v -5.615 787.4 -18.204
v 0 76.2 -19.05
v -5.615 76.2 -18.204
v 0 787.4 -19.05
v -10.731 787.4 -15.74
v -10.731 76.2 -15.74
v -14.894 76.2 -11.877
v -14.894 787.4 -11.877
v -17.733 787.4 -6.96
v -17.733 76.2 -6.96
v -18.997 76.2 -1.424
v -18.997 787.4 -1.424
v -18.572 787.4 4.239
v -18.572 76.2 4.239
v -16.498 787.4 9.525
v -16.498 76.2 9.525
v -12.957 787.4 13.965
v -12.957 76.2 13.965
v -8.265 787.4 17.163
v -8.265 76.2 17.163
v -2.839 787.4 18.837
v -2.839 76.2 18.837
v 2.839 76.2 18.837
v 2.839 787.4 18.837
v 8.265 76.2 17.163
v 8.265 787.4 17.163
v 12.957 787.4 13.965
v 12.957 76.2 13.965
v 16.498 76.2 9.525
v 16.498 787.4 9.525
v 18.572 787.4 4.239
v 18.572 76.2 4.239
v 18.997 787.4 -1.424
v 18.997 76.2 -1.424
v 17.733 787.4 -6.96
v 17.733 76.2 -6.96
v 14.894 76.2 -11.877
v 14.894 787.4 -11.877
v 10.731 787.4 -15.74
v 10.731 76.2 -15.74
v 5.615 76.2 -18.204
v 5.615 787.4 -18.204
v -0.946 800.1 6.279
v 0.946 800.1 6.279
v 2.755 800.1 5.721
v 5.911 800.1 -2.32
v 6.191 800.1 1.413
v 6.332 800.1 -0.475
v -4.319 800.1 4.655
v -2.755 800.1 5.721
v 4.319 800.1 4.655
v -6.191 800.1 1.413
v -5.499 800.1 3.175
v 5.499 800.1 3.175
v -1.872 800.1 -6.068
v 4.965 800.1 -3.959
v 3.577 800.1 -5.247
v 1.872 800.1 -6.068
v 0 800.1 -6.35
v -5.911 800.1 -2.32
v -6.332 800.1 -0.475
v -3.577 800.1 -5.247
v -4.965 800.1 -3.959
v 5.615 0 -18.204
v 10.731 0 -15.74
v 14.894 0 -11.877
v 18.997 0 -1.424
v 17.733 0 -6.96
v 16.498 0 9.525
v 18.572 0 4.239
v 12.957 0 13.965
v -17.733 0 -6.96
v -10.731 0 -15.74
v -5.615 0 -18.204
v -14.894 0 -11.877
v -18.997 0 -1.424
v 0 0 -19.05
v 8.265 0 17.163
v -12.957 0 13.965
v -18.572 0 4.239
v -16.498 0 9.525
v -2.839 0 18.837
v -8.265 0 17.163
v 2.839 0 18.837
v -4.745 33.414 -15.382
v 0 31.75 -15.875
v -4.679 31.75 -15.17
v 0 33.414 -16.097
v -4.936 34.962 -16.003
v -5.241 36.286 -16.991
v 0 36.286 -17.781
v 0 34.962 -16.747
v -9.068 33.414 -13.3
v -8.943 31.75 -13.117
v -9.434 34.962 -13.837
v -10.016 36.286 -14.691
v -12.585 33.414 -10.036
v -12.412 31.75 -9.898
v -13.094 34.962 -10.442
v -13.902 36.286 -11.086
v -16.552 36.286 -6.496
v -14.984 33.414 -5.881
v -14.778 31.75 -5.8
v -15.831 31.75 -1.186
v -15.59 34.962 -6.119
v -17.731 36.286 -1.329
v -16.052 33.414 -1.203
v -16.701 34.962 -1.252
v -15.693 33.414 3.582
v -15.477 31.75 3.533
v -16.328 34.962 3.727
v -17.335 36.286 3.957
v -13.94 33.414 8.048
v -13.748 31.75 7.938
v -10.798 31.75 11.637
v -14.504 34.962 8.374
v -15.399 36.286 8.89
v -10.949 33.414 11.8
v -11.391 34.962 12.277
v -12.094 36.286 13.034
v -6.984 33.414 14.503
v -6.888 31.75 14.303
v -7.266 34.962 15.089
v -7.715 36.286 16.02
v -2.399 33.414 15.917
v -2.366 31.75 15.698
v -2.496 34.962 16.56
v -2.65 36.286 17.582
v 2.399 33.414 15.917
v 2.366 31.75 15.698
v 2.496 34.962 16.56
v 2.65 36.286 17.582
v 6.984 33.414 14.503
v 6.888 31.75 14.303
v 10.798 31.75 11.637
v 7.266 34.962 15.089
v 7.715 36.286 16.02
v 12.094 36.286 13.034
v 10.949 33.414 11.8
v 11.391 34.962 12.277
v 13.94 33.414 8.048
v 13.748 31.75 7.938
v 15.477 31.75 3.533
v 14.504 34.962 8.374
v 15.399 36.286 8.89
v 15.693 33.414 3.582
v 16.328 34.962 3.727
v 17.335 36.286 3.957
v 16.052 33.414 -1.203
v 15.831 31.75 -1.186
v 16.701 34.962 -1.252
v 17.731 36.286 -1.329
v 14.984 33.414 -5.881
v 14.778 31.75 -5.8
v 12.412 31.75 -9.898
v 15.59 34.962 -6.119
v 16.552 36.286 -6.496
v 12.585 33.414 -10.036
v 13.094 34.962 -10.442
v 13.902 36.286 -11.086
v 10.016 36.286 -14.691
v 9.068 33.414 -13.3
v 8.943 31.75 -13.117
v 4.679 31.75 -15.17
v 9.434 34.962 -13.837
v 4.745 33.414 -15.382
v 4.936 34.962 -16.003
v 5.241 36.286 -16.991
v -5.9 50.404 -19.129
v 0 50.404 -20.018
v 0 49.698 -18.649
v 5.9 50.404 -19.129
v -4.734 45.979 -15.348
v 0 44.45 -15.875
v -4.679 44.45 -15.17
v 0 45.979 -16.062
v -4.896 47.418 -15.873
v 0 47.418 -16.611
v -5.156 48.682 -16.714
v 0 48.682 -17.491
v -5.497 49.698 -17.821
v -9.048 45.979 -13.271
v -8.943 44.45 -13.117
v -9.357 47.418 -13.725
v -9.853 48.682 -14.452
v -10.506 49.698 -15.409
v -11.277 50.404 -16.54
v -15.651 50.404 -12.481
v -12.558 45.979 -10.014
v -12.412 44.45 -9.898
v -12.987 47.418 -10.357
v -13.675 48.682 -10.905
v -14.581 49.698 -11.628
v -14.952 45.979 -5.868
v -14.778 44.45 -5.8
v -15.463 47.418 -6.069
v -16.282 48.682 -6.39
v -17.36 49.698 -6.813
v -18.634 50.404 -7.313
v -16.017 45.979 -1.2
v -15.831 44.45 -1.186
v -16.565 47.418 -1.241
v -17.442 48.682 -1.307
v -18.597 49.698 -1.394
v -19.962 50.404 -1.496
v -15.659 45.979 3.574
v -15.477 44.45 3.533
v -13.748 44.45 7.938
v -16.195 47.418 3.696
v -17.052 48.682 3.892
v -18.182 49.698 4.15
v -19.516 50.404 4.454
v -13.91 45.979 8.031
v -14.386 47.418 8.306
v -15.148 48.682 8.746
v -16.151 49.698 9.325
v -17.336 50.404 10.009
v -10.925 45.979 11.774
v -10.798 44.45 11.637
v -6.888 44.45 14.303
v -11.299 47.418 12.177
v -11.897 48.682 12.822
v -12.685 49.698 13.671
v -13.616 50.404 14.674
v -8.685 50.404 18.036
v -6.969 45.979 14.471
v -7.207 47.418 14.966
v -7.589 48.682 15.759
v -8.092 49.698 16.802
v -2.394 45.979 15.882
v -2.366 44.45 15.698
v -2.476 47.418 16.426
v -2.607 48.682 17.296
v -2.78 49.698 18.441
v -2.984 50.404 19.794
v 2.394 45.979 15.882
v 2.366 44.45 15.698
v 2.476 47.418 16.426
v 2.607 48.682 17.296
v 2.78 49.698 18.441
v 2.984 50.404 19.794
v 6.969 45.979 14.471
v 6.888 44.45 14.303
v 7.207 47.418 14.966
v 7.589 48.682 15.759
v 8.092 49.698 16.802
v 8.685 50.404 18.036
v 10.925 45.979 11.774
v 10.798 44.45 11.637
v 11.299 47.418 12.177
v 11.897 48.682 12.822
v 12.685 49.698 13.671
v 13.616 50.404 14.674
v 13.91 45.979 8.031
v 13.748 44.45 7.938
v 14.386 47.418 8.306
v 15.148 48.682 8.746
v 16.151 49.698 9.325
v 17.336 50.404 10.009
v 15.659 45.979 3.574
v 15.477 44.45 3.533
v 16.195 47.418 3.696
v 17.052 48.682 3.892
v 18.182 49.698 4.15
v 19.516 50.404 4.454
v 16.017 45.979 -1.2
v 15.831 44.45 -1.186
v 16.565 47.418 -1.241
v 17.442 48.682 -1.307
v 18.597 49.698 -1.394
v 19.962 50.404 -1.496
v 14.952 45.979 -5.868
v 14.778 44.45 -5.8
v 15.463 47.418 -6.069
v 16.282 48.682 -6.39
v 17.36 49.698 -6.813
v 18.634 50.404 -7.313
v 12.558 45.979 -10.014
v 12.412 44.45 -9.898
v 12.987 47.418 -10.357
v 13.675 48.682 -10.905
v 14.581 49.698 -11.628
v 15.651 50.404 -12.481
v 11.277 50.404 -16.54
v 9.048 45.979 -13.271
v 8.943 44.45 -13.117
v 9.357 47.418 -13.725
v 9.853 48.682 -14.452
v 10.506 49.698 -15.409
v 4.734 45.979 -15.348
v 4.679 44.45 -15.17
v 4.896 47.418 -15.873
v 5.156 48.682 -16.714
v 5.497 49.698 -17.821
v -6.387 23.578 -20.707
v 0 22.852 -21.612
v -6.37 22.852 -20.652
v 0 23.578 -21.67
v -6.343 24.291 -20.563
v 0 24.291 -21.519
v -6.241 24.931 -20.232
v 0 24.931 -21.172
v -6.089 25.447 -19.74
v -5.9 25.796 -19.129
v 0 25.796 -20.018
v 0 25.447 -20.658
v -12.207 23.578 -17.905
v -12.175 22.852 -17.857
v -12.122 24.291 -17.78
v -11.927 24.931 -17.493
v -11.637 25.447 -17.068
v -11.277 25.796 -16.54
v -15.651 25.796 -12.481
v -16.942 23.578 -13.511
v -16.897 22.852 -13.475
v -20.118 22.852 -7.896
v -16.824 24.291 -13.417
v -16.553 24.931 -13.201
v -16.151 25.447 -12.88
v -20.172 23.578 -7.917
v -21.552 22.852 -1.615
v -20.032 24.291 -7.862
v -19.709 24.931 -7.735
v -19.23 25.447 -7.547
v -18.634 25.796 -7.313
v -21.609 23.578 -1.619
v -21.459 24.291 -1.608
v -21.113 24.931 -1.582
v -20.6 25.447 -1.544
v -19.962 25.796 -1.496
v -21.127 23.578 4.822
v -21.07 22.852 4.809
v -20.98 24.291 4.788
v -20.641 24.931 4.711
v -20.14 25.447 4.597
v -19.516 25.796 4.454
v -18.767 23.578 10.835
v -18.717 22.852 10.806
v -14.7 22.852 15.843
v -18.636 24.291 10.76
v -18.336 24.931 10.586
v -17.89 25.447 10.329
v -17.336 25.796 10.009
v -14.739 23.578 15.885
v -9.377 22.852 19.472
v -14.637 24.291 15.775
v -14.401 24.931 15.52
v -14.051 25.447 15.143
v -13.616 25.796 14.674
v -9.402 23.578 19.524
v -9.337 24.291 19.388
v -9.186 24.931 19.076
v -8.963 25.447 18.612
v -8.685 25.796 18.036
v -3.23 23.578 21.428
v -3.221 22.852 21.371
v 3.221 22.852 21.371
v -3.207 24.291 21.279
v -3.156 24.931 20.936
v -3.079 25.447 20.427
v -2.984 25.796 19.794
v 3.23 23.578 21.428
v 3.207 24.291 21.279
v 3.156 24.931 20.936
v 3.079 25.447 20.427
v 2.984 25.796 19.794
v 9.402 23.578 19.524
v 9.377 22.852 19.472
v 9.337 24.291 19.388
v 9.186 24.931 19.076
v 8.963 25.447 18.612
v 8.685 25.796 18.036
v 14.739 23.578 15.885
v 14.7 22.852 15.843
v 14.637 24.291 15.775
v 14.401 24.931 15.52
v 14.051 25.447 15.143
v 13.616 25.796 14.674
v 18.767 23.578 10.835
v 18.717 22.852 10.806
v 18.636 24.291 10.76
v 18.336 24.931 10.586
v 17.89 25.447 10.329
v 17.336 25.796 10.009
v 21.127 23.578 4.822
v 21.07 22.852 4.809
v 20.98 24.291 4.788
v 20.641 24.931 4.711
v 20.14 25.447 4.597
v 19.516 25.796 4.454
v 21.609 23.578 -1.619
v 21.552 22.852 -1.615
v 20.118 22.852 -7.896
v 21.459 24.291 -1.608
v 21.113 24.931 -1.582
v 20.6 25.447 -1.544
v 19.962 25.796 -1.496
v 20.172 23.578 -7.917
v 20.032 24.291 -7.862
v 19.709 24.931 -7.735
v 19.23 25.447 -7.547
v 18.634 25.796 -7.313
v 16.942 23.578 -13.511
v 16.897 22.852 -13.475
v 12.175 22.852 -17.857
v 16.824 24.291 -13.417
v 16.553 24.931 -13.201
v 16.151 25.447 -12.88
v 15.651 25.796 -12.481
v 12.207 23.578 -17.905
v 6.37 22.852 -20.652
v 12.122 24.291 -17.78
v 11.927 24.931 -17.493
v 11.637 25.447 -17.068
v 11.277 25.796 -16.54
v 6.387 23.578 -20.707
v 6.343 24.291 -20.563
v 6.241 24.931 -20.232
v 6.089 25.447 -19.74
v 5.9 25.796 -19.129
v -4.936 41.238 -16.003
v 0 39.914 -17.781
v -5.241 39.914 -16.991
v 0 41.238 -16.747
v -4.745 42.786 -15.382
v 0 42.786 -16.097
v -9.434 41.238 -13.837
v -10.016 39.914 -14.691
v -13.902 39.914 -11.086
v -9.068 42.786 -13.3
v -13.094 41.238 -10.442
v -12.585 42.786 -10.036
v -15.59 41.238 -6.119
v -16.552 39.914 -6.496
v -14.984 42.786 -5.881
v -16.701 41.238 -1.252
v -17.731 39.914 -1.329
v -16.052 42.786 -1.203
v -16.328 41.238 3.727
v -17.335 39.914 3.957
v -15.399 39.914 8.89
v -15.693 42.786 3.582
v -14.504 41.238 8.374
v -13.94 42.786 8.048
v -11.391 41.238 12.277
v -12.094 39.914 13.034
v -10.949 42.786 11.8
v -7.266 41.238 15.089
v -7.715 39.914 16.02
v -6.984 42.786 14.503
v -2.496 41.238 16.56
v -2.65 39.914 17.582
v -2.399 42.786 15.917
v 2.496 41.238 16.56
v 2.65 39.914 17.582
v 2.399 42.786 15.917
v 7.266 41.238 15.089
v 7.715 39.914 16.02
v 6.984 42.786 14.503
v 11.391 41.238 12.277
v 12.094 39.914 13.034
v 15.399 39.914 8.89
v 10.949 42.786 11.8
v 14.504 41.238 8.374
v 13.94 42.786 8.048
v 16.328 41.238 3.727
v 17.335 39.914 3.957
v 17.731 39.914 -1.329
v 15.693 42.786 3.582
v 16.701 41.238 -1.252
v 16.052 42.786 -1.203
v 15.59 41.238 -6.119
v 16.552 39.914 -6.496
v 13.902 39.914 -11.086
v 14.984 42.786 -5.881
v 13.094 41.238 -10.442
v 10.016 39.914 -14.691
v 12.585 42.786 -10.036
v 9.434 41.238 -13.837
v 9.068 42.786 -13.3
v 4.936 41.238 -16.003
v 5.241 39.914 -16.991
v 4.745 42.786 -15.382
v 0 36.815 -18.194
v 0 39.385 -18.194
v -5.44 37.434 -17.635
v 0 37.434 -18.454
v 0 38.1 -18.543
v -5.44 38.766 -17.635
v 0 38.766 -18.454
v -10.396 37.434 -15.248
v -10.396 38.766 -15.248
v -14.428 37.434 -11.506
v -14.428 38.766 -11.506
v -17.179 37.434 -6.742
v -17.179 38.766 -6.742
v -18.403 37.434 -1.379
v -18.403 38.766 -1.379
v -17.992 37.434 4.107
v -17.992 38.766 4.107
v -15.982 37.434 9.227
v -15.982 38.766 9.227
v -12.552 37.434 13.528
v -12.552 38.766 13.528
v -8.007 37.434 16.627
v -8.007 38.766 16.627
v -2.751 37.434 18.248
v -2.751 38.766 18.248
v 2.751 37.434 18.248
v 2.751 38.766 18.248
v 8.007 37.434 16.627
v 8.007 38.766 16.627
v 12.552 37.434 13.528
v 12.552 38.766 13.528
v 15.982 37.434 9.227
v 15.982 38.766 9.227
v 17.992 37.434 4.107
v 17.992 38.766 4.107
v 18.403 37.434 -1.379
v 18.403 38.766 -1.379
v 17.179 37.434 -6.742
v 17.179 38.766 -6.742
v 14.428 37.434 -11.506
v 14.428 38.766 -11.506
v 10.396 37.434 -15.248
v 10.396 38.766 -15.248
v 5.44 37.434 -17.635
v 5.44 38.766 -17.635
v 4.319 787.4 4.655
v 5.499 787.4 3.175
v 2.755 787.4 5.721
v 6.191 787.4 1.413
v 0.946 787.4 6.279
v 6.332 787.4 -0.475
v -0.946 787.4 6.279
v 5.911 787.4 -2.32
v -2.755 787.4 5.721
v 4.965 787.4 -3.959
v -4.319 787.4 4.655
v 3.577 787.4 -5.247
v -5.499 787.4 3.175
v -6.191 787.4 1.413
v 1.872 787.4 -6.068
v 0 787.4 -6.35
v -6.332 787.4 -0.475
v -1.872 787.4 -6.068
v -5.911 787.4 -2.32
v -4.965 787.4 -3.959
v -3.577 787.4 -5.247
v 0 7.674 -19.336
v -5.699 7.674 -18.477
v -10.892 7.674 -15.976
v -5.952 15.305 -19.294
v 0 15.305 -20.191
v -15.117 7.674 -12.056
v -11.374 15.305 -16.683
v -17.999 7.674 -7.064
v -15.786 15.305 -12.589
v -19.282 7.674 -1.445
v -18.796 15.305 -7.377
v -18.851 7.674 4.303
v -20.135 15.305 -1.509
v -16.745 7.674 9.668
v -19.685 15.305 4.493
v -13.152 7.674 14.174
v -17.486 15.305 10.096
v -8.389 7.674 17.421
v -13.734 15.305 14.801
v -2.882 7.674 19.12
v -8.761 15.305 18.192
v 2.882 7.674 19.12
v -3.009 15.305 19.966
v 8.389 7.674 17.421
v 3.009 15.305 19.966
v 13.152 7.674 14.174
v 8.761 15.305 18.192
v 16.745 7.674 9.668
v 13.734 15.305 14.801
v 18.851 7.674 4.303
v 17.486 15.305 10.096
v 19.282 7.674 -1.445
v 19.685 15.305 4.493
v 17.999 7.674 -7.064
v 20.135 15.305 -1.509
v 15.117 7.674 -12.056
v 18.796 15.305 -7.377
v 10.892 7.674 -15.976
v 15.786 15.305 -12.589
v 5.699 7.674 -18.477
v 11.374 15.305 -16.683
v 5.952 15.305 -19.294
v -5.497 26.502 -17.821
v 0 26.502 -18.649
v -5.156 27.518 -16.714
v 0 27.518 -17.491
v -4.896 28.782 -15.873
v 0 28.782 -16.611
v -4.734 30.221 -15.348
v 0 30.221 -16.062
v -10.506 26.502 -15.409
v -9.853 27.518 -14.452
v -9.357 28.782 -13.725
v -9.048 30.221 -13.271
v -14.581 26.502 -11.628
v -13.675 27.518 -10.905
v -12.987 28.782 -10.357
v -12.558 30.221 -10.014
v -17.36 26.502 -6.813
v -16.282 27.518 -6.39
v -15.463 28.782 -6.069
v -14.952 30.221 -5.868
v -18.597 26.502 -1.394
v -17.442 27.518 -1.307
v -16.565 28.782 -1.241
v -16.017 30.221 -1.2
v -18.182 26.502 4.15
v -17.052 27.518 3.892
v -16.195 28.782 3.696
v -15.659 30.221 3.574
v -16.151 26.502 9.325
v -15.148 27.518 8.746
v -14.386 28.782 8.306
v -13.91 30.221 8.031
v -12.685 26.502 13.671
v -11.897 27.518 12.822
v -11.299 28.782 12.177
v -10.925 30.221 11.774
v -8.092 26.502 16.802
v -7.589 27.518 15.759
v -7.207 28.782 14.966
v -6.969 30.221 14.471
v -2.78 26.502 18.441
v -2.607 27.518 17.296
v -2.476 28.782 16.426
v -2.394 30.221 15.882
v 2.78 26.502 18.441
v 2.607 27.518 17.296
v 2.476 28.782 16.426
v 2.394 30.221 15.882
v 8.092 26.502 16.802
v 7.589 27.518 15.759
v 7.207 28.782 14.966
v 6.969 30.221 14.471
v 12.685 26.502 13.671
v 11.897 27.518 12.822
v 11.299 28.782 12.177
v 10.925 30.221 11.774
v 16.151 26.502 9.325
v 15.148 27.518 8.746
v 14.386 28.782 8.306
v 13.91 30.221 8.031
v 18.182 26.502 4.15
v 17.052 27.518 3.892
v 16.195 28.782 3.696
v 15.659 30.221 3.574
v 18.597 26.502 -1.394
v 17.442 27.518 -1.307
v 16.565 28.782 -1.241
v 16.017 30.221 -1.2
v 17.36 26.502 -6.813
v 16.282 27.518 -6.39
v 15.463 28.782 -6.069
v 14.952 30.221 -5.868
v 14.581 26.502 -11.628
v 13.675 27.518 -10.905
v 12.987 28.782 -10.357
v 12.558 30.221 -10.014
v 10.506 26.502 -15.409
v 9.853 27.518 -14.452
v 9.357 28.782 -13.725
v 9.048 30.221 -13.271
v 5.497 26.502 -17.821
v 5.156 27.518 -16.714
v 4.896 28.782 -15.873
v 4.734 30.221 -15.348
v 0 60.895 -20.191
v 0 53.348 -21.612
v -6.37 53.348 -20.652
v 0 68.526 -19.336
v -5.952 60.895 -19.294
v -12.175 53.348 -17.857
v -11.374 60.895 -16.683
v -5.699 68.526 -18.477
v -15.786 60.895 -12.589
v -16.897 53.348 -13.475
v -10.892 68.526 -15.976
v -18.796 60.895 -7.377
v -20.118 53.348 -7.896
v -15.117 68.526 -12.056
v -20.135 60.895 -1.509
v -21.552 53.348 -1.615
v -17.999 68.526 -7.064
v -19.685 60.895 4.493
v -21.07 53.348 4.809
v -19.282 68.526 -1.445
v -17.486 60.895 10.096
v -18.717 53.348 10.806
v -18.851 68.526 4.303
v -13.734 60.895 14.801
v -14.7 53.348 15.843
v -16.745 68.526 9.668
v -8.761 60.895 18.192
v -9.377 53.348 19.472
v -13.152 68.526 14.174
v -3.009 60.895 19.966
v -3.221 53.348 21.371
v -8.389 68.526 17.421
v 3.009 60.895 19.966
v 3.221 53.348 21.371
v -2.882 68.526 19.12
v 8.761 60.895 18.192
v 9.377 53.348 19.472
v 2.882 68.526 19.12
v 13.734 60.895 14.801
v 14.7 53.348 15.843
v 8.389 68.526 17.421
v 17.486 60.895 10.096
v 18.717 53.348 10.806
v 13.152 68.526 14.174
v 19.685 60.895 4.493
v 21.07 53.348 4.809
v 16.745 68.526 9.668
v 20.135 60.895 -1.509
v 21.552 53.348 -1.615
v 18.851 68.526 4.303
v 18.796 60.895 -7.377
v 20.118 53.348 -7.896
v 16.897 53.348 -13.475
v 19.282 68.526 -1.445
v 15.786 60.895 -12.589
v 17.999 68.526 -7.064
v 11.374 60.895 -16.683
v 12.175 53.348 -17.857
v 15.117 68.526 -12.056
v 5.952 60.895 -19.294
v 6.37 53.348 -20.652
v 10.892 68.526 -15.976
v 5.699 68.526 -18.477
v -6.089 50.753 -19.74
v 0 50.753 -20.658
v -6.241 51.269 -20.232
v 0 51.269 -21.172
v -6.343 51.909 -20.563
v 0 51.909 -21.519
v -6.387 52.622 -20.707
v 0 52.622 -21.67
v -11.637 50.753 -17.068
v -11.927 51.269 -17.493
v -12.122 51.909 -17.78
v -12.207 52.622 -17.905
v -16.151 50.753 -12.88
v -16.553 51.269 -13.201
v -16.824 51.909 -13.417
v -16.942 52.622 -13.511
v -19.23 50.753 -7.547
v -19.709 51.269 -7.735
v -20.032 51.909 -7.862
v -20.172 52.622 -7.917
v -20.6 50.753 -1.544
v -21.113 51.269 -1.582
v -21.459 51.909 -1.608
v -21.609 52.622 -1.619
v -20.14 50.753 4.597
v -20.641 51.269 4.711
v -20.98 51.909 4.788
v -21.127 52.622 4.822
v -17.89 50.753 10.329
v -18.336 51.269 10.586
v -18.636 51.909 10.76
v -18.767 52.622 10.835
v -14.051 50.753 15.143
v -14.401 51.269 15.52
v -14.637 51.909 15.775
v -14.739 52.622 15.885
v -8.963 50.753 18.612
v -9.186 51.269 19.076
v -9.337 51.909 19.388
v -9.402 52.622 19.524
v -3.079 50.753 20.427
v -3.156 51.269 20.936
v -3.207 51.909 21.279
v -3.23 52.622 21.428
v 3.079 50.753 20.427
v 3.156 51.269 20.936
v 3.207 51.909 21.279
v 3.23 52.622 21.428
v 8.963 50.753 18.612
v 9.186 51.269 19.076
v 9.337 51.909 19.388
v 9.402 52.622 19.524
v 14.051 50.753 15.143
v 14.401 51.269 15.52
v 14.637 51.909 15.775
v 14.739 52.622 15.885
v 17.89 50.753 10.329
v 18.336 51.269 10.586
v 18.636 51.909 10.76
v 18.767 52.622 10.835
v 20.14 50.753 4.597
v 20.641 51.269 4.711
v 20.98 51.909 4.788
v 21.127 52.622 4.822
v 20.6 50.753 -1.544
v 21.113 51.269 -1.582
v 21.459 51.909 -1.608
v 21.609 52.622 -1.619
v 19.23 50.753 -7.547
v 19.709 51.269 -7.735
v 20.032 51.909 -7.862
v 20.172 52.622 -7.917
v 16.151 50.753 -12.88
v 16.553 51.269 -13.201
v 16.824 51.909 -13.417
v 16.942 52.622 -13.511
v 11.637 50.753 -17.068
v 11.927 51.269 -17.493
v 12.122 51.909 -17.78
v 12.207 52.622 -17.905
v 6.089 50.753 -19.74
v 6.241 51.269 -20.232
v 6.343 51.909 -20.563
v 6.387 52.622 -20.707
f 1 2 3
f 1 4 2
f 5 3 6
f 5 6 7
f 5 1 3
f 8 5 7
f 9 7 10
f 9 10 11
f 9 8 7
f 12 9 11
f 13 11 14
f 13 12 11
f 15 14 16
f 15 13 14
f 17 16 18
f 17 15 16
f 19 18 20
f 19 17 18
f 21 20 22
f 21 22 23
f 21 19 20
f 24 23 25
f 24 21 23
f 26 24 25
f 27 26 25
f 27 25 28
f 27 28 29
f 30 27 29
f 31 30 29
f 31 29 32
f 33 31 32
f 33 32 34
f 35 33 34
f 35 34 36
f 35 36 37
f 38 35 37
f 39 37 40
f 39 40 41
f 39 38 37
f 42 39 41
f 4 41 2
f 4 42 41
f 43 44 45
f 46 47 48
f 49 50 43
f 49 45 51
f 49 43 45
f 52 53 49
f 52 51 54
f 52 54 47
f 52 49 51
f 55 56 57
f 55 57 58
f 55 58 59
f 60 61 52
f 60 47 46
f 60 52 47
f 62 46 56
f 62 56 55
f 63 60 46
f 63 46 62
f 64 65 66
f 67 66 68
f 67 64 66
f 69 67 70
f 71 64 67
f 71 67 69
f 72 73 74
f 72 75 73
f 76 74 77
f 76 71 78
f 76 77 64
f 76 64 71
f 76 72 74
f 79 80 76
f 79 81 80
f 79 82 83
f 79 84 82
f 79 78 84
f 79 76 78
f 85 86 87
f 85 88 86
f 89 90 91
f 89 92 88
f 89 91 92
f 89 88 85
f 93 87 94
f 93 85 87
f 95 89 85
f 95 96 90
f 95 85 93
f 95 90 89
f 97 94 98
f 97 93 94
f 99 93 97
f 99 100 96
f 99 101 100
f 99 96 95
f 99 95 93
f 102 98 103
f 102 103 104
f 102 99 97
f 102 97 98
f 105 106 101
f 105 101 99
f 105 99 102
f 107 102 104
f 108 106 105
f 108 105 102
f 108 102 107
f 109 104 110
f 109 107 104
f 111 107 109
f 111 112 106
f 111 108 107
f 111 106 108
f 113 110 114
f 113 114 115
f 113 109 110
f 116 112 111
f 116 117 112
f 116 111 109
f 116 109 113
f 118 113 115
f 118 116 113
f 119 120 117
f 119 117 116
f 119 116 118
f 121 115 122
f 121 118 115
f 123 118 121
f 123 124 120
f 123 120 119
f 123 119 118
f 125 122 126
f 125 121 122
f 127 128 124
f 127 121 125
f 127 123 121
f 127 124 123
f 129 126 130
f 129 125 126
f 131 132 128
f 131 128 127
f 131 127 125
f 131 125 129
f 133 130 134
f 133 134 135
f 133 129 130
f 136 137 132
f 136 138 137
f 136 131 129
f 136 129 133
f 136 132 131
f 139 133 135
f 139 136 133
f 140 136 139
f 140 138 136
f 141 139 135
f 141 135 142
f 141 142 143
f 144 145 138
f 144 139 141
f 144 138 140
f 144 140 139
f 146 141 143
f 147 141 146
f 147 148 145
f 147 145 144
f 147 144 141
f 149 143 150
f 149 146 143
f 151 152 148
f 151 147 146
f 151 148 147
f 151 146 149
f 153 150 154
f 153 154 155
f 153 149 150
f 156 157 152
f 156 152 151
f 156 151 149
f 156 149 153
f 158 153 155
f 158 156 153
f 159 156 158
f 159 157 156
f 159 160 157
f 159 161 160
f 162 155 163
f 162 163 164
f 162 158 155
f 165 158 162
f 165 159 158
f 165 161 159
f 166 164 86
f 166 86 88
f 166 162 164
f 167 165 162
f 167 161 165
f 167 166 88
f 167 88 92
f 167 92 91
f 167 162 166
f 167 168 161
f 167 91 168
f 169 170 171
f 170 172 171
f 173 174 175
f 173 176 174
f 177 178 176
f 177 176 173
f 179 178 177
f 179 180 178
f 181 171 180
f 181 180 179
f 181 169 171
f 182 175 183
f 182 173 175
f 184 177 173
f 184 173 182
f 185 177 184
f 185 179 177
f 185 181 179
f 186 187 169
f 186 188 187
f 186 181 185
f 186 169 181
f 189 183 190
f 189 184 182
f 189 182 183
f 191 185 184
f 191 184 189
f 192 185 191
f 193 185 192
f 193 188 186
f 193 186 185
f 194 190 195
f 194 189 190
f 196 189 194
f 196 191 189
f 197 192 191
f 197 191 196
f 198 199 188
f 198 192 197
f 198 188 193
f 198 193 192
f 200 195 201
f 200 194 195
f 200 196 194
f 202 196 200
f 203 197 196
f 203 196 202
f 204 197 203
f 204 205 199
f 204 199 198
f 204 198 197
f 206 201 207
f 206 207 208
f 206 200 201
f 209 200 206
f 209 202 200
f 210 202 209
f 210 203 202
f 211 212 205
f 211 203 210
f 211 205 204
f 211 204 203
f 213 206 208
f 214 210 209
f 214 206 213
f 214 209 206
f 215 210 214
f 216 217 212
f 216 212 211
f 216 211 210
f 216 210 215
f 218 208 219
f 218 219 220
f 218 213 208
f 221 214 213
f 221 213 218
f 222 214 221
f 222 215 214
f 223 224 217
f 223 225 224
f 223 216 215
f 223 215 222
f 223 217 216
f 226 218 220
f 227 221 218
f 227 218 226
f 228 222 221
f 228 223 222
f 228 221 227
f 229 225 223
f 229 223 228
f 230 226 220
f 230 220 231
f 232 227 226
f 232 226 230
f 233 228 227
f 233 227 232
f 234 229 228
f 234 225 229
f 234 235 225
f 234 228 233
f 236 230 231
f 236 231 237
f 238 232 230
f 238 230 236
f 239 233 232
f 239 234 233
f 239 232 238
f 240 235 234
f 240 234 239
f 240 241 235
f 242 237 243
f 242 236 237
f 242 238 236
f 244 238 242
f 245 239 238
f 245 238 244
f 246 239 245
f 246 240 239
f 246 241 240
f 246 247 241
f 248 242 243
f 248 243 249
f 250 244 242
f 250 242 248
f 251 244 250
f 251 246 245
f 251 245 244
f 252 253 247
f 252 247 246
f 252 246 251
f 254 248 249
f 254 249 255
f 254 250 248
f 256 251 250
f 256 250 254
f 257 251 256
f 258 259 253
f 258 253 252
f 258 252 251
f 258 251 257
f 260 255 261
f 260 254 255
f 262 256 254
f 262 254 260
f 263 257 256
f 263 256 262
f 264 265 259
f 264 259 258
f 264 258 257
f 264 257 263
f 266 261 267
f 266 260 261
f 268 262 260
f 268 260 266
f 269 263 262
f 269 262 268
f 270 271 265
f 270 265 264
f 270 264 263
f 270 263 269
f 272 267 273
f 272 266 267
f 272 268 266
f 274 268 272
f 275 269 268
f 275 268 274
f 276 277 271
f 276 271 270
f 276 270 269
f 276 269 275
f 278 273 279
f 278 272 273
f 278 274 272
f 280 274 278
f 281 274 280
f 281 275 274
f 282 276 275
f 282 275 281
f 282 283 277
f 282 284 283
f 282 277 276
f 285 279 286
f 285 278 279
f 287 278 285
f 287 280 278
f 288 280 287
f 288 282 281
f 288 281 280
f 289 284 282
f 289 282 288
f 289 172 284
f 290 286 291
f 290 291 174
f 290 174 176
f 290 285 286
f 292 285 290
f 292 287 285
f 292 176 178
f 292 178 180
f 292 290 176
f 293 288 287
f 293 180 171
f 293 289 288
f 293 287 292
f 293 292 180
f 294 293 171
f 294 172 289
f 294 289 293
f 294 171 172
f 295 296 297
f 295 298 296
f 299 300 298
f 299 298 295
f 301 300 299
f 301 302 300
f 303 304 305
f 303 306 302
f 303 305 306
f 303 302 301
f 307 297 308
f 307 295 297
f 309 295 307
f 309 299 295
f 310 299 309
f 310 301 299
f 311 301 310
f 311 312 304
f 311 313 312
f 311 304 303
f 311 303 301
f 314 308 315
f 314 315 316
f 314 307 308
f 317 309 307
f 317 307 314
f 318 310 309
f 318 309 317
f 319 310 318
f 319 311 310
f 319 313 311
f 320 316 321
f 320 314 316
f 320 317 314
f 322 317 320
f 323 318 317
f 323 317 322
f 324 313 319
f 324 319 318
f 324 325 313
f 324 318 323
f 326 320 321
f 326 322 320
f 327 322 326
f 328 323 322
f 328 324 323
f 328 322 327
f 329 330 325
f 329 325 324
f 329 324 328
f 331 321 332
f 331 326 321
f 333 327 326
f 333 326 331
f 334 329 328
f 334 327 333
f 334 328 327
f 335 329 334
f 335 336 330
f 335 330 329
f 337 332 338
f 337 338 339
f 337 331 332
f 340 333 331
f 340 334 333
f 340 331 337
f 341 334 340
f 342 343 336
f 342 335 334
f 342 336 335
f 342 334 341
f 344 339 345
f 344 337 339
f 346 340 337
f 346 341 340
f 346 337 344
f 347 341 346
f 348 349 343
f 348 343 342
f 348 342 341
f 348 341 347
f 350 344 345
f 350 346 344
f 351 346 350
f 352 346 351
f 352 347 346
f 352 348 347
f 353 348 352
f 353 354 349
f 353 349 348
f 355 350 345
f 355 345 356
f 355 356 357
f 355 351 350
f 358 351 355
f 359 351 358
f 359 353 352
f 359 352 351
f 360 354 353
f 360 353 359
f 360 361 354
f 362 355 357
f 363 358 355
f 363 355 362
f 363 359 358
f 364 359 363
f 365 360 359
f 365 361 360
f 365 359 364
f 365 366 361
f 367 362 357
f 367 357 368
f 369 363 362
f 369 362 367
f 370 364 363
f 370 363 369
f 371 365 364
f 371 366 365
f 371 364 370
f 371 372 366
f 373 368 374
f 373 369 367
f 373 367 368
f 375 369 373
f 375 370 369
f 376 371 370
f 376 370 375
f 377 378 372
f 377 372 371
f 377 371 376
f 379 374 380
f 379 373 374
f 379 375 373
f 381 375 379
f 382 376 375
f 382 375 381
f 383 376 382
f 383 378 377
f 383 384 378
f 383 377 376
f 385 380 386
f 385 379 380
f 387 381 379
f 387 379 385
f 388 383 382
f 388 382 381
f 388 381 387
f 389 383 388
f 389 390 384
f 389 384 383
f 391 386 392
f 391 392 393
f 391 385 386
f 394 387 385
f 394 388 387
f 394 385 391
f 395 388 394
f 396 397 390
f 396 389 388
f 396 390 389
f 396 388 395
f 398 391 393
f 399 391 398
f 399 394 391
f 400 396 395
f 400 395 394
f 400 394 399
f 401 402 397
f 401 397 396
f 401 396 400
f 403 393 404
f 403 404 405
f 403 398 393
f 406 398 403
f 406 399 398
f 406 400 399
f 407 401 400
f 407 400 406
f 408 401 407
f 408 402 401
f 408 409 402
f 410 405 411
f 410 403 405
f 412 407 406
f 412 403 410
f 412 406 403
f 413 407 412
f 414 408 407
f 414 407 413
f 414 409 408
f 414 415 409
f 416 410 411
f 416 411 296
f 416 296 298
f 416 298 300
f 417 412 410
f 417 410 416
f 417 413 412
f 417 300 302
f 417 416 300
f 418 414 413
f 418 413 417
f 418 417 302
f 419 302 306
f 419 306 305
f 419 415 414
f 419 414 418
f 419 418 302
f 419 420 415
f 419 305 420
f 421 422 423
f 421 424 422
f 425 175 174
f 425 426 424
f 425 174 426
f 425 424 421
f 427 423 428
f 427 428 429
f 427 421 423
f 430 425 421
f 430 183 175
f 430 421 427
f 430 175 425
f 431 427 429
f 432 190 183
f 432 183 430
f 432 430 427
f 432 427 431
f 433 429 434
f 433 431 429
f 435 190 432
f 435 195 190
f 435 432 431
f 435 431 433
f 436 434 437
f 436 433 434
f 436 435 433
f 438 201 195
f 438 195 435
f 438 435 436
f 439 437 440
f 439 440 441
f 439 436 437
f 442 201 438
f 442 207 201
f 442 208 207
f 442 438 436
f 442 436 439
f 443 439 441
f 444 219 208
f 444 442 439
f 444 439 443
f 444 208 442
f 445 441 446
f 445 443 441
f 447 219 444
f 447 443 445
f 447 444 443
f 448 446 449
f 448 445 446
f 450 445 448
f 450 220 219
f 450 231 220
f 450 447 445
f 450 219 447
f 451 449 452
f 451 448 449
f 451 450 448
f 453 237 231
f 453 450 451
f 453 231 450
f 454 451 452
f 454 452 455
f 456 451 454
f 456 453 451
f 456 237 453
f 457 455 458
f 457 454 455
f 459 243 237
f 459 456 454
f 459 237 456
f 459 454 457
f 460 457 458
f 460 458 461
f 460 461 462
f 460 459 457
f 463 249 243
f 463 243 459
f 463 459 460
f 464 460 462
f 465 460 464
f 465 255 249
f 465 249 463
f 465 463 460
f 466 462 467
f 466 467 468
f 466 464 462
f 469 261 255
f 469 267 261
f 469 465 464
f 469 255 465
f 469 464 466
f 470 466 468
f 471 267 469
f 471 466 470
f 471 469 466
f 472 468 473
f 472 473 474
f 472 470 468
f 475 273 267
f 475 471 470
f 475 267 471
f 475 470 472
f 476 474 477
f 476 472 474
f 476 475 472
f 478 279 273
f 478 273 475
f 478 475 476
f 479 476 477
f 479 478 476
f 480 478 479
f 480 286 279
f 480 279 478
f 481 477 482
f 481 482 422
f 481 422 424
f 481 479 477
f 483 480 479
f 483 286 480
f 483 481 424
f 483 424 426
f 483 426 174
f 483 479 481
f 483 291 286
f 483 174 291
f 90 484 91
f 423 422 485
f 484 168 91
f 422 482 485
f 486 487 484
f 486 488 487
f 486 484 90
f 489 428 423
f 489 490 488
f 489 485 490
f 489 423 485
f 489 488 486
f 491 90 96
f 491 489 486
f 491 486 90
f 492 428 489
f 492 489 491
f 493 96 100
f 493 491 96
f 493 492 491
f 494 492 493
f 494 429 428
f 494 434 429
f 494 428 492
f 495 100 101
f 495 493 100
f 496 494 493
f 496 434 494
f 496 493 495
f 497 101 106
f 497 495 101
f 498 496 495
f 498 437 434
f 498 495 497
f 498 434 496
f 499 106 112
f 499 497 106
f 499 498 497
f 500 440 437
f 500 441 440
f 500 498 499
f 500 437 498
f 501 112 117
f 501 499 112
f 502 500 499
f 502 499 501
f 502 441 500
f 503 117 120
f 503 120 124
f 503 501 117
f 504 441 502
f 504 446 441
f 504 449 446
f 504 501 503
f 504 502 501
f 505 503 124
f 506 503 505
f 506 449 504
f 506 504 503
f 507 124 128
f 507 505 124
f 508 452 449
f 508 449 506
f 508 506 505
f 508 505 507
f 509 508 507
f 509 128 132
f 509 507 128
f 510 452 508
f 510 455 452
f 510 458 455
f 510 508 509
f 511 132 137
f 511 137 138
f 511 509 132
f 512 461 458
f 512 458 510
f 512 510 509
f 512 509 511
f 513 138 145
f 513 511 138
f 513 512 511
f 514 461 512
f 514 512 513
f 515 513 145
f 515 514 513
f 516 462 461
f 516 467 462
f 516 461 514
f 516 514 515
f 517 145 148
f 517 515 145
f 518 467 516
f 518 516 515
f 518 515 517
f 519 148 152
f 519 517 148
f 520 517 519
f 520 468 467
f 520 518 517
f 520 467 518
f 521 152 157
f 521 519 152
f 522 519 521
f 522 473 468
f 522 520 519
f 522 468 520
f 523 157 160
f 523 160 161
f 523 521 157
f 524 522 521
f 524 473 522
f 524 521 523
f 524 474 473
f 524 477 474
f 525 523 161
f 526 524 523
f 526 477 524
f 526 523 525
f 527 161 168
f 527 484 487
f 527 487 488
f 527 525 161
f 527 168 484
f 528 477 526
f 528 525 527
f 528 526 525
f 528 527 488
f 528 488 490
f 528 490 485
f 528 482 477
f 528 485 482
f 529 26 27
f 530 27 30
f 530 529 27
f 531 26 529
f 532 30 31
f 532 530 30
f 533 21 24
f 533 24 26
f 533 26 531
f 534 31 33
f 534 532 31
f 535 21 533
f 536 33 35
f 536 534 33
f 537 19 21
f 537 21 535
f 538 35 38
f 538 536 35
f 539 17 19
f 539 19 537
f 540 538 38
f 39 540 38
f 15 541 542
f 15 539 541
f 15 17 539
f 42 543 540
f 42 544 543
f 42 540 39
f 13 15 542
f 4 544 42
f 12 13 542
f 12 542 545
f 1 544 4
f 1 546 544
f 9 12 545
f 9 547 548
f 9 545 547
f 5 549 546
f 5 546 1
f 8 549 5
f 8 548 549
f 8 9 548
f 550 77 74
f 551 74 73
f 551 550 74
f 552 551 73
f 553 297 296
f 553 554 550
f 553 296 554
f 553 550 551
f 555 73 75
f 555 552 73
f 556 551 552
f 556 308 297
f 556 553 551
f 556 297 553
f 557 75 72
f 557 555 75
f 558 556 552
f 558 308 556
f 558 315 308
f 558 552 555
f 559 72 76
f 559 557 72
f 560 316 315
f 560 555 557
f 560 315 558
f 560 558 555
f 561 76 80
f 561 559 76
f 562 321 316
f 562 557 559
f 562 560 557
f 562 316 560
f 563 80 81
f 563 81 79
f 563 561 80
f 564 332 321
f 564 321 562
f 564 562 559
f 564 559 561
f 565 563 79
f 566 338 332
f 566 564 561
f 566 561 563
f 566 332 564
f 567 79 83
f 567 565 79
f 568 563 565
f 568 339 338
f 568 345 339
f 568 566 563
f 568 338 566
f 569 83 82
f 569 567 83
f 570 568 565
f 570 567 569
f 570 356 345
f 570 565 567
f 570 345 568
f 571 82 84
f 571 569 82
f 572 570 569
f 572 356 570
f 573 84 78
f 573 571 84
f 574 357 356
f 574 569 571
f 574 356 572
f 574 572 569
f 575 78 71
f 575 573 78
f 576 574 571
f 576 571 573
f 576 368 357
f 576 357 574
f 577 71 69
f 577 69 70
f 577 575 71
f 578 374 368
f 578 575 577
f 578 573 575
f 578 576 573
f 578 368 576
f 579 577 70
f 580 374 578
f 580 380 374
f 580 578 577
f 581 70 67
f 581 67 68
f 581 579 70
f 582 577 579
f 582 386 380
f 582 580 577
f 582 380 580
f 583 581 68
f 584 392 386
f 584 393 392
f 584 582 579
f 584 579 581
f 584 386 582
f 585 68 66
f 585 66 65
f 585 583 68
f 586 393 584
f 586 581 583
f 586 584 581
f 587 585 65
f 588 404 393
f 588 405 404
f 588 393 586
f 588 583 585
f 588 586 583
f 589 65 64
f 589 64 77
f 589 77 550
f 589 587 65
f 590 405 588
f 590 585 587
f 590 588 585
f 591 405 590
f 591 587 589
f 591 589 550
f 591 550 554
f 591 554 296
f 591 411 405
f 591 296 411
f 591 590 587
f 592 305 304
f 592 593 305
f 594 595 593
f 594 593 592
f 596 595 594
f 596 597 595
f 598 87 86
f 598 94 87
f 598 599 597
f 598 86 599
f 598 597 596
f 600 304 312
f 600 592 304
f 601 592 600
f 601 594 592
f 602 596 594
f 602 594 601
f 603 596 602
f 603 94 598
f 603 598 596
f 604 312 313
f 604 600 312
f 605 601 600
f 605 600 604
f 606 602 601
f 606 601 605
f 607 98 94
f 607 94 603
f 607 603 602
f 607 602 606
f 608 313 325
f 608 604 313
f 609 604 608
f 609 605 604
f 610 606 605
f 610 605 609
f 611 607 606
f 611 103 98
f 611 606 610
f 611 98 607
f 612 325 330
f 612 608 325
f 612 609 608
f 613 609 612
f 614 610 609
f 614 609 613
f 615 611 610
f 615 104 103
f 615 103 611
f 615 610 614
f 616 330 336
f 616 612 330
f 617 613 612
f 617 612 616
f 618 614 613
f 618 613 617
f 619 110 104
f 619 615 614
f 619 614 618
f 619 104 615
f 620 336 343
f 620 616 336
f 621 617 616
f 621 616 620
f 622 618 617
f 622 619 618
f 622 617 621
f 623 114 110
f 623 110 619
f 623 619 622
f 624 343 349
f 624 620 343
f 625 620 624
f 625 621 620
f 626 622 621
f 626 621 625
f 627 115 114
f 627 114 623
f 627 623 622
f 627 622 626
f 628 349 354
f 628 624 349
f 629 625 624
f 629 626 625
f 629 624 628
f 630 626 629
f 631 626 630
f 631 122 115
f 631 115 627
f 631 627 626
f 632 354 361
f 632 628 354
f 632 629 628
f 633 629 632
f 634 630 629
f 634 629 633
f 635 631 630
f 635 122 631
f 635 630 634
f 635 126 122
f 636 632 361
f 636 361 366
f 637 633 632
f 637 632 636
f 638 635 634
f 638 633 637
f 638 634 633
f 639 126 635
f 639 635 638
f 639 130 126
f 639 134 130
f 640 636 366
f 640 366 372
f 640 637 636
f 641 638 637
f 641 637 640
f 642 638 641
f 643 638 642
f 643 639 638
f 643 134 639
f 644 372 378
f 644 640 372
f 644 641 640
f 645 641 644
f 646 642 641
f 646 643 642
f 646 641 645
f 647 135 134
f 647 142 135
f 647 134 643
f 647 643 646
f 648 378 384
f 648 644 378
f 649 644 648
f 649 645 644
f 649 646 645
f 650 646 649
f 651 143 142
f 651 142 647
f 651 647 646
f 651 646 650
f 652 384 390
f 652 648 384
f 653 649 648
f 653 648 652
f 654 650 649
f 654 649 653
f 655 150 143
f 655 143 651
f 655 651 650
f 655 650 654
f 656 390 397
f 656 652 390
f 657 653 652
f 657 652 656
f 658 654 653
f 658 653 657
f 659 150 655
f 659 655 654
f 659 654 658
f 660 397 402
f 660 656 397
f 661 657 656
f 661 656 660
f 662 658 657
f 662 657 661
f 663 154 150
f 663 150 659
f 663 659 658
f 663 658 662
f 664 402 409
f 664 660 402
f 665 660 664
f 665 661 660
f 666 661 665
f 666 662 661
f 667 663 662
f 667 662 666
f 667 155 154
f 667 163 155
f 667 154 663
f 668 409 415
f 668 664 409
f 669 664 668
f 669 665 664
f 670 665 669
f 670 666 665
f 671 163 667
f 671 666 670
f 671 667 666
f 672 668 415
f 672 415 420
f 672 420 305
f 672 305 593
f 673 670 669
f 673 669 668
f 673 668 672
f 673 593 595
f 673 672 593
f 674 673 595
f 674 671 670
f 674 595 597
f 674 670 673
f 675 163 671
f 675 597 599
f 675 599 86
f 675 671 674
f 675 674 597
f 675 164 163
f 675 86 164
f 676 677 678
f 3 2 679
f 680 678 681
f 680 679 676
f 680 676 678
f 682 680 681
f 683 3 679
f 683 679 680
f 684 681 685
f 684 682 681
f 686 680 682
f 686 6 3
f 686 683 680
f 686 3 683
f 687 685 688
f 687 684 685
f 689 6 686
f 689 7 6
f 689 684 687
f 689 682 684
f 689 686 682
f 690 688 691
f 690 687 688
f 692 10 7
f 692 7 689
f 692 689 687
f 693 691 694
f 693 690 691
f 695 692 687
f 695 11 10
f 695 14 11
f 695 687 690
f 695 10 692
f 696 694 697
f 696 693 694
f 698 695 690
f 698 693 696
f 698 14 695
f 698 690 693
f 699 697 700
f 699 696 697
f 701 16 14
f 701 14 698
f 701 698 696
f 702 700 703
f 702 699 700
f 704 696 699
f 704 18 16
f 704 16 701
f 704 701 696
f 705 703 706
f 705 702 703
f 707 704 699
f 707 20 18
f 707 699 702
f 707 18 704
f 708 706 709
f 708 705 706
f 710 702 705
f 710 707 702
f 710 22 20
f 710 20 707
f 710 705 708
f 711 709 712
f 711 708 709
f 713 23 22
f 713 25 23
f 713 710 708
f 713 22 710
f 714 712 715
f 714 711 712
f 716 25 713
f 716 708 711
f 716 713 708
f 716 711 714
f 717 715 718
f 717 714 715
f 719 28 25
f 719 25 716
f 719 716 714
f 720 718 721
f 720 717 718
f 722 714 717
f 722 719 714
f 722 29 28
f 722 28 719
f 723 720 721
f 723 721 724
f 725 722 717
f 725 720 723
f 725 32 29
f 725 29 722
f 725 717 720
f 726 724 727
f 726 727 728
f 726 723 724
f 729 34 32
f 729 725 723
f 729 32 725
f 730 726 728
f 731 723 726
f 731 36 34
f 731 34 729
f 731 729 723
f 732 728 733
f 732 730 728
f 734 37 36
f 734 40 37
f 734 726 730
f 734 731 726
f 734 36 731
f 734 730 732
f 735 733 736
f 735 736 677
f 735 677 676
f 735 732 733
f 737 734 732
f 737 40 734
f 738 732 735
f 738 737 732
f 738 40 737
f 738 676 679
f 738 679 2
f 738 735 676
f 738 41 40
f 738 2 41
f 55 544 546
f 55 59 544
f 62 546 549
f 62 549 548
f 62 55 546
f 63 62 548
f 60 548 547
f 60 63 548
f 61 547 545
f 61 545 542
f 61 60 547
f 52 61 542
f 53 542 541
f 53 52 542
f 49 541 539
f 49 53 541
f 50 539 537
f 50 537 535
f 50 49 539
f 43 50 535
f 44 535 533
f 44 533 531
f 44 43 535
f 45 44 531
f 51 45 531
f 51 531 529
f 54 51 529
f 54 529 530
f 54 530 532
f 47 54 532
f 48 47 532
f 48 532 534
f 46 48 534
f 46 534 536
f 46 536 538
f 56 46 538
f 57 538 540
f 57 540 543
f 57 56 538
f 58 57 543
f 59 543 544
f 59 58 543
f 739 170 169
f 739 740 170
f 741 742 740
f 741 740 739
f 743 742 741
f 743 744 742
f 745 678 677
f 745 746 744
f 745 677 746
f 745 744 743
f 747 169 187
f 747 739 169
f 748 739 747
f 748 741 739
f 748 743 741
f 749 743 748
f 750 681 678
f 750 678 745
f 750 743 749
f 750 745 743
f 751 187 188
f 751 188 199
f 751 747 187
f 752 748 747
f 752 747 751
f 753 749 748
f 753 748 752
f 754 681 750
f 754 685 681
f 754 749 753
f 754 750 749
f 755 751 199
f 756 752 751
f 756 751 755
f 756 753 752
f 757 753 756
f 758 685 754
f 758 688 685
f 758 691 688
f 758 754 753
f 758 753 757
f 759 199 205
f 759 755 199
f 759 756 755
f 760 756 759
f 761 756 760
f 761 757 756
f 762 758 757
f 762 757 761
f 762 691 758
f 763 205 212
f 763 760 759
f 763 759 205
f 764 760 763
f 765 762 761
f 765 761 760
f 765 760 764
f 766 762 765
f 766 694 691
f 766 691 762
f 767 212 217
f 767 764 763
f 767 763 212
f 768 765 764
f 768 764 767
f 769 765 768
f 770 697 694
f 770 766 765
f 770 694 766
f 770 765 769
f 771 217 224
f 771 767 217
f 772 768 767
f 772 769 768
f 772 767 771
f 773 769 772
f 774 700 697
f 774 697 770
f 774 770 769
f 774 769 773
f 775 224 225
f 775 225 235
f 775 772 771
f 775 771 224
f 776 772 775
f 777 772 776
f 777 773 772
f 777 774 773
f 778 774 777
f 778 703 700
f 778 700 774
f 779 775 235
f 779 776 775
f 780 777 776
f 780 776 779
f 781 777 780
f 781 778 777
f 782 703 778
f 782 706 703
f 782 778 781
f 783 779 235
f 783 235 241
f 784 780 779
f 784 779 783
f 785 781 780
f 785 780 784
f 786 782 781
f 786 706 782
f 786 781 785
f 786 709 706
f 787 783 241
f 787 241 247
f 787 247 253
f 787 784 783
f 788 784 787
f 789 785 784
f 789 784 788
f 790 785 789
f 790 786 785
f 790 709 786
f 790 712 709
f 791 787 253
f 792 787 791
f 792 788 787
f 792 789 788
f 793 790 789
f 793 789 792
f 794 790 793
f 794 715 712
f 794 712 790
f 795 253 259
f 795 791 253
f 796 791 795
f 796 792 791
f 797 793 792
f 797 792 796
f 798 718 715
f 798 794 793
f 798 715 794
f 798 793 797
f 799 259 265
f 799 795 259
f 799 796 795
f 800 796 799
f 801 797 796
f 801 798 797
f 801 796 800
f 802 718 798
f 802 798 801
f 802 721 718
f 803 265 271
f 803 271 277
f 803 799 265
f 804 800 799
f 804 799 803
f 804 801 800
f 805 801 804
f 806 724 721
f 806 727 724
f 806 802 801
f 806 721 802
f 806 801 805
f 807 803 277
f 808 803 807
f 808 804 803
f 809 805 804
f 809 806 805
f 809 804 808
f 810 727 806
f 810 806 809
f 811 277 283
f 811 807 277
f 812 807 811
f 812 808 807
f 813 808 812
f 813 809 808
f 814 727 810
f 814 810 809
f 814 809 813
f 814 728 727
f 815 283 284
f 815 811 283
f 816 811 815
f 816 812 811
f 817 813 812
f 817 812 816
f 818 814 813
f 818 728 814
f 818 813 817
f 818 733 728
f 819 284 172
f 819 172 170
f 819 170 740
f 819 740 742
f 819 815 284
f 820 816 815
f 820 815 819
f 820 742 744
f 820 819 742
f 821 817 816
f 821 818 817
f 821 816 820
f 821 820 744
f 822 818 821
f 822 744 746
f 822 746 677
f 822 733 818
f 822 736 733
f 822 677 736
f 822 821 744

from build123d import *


with BuildPart() as part:
    # revolve sketch → Revolve1 (revolve)
    with BuildSketch(Plane.XY, mode=Mode.PRIVATE) as revolve1_sk:
        with BuildLine():
            Line((0, 0), (19.05, 0))
            ThreePointArc((19.05, 0), (19.692539758, 11.497446902), (21.612156952, 22.851706562))
            ThreePointArc((21.612156952, 22.851706562), (21.368821871, 24.623609523), (20.018018165, 25.795864363))
            ThreePointArc((20.018018165, 25.795864363), (17.012666806, 28.123144244), (15.875, 31.75))
            ThreePointArc((15.875, 31.75), (16.370840305, 34.209941923), (17.780925752, 36.285714286))
            ThreePointArc((17.780925752, 36.285714286), (18.543296053, 38.1), (17.780925752, 39.914285714))
            ThreePointArc((17.780925752, 39.914285714), (16.370840305, 41.990058077), (15.875, 44.45))
            ThreePointArc((15.875, 44.45), (17.012666806, 48.076855756), (20.018018165, 50.404135637))
            ThreePointArc((20.018018165, 50.404135637), (21.368821871, 51.576390477), (21.612156952, 53.348293438))
            ThreePointArc((21.612156952, 53.348293438), (19.692539758, 64.702553098), (19.05, 76.2))
            Line((19.05, 76.2), (19.05, 787.4))
            Line((19.05, 787.4), (6.35, 787.4))
            Line((6.35, 787.4), (6.35, 800.1))
            Line((6.35, 800.1), (0, 800.1))
            Line((0, 800.1), (0, 0))
        make_face()
    revolve(revolve1_sk.sketch.rotate(Axis((0, -55, 0), (0, 1, 0)), 90), axis=Axis((0, -55, 0), (0, 1, 0)))


solid = part.part
